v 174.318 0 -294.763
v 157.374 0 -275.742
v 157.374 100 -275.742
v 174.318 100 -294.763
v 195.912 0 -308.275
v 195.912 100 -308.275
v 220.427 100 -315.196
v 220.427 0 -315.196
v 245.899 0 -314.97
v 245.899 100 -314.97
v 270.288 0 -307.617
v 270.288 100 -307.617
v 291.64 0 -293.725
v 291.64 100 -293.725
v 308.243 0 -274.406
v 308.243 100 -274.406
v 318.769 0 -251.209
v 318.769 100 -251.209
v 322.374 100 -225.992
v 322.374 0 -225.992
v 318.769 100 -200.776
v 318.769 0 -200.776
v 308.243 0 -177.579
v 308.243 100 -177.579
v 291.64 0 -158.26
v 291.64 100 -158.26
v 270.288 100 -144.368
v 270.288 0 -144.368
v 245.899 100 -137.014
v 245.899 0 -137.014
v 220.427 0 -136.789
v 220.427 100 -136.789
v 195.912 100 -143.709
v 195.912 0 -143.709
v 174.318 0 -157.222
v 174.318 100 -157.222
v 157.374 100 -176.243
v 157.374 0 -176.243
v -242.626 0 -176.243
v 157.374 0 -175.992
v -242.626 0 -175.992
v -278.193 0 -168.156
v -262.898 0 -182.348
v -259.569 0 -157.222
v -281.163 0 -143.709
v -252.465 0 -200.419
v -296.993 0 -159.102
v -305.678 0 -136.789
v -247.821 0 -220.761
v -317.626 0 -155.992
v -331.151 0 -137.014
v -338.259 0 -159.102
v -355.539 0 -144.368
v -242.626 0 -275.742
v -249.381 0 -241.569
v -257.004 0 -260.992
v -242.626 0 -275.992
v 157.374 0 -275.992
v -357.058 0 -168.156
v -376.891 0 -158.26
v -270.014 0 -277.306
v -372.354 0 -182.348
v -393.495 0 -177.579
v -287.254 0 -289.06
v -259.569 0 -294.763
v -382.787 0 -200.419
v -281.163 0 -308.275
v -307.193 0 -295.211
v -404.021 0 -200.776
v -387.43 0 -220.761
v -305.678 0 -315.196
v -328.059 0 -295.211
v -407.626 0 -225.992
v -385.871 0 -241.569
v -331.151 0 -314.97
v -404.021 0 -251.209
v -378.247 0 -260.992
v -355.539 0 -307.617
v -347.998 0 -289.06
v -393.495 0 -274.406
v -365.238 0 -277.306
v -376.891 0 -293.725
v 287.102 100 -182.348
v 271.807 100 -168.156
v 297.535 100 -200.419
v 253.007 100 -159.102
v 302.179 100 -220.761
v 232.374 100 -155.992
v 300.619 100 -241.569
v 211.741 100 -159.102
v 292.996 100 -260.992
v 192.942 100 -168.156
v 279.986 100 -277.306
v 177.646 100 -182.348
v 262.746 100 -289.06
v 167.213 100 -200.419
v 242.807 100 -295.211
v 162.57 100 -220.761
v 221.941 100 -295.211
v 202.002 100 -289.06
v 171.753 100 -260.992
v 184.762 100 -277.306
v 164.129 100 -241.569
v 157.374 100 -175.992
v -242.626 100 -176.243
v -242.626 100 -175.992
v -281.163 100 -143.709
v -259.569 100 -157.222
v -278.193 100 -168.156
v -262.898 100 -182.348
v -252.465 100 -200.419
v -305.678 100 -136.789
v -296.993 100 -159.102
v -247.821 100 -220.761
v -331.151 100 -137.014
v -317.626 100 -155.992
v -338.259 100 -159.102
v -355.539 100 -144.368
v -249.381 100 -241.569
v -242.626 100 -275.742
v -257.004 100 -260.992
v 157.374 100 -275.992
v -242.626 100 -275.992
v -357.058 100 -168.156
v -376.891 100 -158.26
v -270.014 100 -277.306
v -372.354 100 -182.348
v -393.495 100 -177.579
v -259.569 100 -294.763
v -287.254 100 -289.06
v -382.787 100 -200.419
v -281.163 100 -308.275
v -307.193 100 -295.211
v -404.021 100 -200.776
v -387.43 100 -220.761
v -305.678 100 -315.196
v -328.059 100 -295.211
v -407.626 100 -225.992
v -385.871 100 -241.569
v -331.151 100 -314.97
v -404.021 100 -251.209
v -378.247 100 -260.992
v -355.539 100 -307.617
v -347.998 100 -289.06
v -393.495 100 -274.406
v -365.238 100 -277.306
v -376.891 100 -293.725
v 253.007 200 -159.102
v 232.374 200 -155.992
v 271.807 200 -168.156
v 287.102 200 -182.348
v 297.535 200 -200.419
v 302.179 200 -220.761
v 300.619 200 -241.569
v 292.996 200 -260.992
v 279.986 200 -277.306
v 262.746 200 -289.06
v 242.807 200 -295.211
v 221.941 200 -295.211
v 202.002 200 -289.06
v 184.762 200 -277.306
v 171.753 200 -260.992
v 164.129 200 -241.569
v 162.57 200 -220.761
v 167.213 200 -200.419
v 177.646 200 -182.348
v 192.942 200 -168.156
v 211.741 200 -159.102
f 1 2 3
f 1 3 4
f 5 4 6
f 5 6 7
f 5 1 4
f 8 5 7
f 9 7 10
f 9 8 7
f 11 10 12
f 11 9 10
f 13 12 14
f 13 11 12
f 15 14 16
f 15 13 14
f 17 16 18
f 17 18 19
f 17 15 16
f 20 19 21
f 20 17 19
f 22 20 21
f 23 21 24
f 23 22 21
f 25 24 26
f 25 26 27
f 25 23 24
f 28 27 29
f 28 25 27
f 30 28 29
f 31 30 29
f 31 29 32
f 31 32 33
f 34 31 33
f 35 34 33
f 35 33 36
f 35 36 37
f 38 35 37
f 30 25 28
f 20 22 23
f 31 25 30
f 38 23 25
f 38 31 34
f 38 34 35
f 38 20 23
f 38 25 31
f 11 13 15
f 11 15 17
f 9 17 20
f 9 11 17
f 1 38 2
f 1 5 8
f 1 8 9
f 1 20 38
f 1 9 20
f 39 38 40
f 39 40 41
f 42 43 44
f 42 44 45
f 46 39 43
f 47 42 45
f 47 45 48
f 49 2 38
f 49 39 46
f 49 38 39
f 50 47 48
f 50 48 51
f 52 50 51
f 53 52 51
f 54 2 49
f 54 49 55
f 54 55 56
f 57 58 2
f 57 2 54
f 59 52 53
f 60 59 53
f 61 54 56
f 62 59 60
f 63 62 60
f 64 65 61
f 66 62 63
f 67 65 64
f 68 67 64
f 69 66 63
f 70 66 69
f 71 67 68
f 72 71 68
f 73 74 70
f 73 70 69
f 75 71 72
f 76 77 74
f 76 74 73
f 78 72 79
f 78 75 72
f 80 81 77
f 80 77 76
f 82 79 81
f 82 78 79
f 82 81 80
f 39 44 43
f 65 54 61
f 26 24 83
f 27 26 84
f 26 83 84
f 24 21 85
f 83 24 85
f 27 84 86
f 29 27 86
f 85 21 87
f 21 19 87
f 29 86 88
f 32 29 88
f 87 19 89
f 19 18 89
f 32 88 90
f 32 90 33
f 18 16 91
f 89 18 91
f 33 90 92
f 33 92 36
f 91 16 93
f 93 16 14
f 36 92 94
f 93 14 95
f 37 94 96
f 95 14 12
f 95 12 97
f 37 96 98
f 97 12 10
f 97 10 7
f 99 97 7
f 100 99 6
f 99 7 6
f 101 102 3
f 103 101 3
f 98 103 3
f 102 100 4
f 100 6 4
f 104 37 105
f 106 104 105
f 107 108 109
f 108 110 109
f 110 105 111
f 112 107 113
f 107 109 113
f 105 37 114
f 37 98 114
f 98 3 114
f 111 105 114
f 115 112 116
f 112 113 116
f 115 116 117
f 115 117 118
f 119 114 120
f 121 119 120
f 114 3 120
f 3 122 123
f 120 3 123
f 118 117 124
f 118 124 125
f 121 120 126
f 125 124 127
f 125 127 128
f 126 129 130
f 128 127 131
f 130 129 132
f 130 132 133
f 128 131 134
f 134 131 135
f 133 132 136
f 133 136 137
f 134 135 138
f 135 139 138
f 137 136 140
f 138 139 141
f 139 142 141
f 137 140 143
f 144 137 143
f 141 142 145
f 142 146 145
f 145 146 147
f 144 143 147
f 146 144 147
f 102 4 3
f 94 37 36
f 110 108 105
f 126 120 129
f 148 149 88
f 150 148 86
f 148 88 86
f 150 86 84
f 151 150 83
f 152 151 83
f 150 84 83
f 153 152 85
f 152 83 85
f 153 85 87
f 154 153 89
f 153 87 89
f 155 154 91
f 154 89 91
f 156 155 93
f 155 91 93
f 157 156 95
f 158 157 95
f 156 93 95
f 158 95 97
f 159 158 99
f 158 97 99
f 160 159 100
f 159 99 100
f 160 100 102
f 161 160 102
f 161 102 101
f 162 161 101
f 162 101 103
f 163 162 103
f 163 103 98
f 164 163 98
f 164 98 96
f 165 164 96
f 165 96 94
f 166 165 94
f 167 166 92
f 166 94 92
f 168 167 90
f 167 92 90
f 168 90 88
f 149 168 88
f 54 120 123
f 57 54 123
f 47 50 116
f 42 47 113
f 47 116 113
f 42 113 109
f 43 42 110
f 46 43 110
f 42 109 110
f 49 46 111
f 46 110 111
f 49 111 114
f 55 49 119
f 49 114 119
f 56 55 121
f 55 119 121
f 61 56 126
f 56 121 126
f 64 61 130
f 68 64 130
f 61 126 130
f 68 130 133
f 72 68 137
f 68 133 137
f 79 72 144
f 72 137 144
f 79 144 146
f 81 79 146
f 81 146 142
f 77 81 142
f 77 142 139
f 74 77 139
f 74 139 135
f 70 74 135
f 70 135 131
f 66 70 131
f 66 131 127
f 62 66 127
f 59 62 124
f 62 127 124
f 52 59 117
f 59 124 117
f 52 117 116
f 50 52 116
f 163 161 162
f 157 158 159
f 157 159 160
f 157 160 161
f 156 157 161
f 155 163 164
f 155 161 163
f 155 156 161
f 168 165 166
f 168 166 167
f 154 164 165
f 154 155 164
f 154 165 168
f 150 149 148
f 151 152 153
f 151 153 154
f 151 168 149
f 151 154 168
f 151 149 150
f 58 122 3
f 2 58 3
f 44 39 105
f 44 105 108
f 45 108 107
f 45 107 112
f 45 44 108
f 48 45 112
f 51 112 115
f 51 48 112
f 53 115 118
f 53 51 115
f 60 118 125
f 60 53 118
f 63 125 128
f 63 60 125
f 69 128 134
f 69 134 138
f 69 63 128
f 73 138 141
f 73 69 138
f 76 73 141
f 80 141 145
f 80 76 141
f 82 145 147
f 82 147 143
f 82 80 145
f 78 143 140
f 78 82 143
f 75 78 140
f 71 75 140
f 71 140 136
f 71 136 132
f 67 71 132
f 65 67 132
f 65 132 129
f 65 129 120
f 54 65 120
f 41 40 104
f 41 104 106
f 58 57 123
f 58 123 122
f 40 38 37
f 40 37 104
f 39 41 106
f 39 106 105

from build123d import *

# Parameters (mm, degrees)
BOSS_EXTRUDE1_DEPTH = 100
SKETCH2_R           = 70
CUT_EXTRUDE1_DEPTH  = 100
SKETCH3_R           = 70
BOSS_EXTRUDE2_DEPTH = 100


with BuildPart() as part:
    # Sketch1 → Boss-Extrude1 (new body)
    with BuildSketch(Plane(origin=(0, 0, 0), x_dir=(1, 0, 0), z_dir=(0, 1, 0))):
        with BuildLine():
            Line((-242.625717576, 275.741810419), (-242.625717576, 275.992438563))
            Line((-242.625717576, 275.992438563), (157.374282424, 275.992438563))
            Line((157.374282424, 275.992438563), (157.374282424, 275.741810419))
            ThreePointArc((157.374282424, 275.741810419), (322.374282424, 225.992438563), (157.374282424, 176.243066708))
            Line((157.374282424, 176.243066708), (157.374282424, 175.992438563))
            Line((157.374282424, 175.992438563), (-242.625717576, 175.992438563))
            Line((-242.625717576, 175.992438563), (-242.625717576, 176.243066708))
            ThreePointArc((-242.625717576, 176.243066708), (-407.625717576, 225.992438563), (-242.625717576, 275.741810419))
        make_face()
    extrude(amount=BOSS_EXTRUDE1_DEPTH)

    # Sketch2 → Cut-Extrude1 (cut)
    with BuildSketch(Plane(origin=(0, 100, 0), x_dir=(1, 0, 0), z_dir=(0, 1, 0))):
        with Locations(Location((-317.625717576, 225.992438563, 0), (0, 0, 270))):
            Circle(SKETCH2_R)
    extrude(amount=-CUT_EXTRUDE1_DEPTH, mode=Mode.SUBTRACT)

    # Sketch3 → Boss-Extrude2 (add)
    with BuildSketch(Plane(origin=(0, 100, 0), x_dir=(1, 0, 0), z_dir=(0, 1, 0))):
        with Locations(Location((232.374282424, 225.992438563, 0), (0, 0, 270))):
            Circle(SKETCH3_R)
    extrude(amount=BOSS_EXTRUDE2_DEPTH)


solid = part.part
